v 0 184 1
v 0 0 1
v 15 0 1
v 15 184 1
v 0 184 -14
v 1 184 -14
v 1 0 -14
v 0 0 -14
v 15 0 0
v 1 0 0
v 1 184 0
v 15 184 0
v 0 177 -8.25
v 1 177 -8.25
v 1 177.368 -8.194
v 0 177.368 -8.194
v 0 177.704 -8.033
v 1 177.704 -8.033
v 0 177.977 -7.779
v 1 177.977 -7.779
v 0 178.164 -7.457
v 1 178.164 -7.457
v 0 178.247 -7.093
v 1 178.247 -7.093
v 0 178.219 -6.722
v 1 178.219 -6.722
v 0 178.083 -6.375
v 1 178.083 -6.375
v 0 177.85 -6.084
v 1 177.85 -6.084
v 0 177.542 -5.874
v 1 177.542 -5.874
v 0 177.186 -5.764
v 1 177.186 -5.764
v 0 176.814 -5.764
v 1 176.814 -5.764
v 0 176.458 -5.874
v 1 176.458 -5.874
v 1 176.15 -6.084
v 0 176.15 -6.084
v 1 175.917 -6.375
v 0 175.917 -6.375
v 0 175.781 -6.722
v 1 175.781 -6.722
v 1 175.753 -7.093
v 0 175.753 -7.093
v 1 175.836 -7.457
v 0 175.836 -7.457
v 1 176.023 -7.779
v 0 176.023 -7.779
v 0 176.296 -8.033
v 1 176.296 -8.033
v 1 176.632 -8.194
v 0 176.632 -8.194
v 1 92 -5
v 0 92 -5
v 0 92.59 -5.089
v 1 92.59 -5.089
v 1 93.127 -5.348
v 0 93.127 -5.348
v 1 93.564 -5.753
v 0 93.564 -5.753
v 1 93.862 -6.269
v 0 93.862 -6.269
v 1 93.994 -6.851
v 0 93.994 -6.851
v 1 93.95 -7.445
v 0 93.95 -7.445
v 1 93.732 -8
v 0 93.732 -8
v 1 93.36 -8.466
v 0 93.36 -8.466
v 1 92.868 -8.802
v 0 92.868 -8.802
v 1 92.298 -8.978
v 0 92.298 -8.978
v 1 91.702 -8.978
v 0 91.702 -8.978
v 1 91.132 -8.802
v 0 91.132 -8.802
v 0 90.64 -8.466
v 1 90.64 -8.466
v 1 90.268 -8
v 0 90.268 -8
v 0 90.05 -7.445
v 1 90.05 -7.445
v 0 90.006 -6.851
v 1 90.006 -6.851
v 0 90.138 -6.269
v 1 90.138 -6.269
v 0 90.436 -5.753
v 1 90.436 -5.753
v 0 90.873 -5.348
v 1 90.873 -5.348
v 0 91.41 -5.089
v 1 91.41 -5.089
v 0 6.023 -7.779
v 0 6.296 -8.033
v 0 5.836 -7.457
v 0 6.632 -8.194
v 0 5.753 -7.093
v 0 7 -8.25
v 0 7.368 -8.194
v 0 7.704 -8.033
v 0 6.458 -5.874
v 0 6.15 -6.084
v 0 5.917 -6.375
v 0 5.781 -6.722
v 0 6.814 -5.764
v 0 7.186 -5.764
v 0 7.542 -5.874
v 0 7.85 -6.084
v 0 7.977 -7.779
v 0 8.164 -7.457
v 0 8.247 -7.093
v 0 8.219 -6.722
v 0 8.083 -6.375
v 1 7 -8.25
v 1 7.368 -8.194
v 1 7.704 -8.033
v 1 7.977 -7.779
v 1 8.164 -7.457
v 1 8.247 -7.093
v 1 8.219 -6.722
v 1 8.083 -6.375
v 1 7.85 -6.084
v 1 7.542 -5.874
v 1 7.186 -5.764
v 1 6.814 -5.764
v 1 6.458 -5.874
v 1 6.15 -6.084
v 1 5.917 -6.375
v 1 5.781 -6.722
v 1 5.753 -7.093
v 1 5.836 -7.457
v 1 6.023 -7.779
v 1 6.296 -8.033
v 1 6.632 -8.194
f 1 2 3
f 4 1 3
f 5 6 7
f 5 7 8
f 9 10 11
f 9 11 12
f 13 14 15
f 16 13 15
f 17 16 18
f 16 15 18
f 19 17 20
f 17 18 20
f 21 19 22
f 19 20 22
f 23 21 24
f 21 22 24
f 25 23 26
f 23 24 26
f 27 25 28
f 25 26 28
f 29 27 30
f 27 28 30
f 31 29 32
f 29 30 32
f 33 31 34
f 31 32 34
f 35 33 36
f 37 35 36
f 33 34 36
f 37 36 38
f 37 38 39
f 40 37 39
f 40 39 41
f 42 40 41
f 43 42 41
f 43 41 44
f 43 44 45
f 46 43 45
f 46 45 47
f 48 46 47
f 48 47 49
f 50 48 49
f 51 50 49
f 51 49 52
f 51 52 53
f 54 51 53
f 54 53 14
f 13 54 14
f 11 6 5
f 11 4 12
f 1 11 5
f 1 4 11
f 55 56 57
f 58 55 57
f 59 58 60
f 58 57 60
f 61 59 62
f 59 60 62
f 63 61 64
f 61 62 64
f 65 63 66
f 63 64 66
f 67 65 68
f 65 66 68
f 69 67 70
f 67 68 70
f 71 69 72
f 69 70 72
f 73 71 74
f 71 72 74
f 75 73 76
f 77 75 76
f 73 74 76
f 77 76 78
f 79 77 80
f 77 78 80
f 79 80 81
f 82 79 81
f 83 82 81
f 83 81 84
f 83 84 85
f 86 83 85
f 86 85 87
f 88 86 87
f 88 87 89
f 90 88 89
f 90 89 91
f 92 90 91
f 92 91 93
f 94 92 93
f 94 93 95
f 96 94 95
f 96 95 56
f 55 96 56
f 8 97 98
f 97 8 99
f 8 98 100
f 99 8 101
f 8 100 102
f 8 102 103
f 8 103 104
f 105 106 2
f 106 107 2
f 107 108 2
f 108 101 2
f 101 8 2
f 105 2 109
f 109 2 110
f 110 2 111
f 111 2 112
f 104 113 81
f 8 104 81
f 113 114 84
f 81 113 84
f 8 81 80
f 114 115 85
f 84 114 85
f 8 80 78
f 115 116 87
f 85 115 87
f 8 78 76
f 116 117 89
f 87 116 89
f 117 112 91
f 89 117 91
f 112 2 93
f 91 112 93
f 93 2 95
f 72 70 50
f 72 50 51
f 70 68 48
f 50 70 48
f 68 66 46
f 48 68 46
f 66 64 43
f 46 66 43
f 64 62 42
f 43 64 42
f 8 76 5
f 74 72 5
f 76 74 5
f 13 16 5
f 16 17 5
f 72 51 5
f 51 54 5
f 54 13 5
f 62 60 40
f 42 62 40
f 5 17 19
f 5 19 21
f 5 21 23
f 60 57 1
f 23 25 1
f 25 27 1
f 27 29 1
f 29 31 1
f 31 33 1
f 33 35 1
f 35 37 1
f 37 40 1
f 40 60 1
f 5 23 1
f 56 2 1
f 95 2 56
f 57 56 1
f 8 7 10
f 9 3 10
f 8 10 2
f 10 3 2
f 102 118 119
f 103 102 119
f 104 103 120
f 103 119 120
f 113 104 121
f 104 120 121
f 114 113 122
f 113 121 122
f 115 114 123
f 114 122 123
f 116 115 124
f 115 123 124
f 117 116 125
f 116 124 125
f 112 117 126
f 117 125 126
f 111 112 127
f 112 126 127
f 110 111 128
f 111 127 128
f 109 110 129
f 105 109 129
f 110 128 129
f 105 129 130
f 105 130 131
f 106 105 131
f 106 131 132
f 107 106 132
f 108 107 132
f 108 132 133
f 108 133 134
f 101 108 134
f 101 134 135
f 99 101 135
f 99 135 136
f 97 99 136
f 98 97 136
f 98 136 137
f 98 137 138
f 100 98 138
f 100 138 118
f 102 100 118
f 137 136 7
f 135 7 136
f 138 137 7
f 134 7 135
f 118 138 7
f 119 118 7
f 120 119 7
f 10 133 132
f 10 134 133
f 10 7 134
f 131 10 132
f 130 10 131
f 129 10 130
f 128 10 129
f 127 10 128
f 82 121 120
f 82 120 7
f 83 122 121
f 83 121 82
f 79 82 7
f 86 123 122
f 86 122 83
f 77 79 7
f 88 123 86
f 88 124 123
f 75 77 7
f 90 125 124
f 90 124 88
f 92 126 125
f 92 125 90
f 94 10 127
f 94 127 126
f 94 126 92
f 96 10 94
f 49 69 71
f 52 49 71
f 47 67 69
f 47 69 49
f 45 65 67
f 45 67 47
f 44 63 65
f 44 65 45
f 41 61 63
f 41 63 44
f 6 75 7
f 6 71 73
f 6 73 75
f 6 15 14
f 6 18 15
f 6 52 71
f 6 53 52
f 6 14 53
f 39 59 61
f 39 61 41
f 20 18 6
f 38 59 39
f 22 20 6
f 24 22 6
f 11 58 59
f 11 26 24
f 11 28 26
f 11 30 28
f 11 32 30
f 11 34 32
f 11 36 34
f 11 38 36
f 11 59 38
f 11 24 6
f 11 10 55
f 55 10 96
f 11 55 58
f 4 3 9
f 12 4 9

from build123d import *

# Parameters (mm, degrees)
SKETCH_1_W          = 15
SKETCH_1_H          = 1
EXTRUDE_1_DEPTH     = 184
SKETCH_3_W          = 1
SKETCH_3_H          = 184
EXTRUDE_2_DEPTH     = 14
M3X0_5_1_D          = 2.5
SKETCH_7_R          = 2
CUT_EXTRUDE_1_DEPTH = 92


with BuildPart() as part:
    # ｽｹｯﾁ1 → ﾎﾞｽ - 押し出し1 (new body)
    with BuildSketch(Plane(origin=(0, 0, 0), x_dir=(1, 0, 0), z_dir=(0, 1, 0))):
        with Locations((7.5, -0.5)):
            Rectangle(SKETCH_1_W, SKETCH_1_H)
    extrude(amount=EXTRUDE_1_DEPTH)

    # ｽｹｯﾁ3 → ﾎﾞｽ - 押し出し2 (add)
    with BuildSketch(Plane(origin=(0, 0, 0), x_dir=(-1, 0, 0), z_dir=(0, 0, -1))):
        with Locations((-0.5, 92)):
            Rectangle(SKETCH_3_W, SKETCH_3_H)
    extrude(amount=EXTRUDE_2_DEPTH)

    # M3x0.5 ねじ穴1 (through all)
    with Locations(Plane.ZY):
        with Locations((-7, 7), (-7, 177)):
            Hole(M3X0_5_1_D / 2)

    # ｽｹｯﾁ7 → ｶｯﾄ - 押し出し1 (cut)
    with BuildSketch(Plane.ZY):
        with Locations((-7, 92)):
            Circle(SKETCH_7_R)
    extrude(amount=-CUT_EXTRUDE_1_DEPTH, mode=Mode.SUBTRACT)


solid = part.part
